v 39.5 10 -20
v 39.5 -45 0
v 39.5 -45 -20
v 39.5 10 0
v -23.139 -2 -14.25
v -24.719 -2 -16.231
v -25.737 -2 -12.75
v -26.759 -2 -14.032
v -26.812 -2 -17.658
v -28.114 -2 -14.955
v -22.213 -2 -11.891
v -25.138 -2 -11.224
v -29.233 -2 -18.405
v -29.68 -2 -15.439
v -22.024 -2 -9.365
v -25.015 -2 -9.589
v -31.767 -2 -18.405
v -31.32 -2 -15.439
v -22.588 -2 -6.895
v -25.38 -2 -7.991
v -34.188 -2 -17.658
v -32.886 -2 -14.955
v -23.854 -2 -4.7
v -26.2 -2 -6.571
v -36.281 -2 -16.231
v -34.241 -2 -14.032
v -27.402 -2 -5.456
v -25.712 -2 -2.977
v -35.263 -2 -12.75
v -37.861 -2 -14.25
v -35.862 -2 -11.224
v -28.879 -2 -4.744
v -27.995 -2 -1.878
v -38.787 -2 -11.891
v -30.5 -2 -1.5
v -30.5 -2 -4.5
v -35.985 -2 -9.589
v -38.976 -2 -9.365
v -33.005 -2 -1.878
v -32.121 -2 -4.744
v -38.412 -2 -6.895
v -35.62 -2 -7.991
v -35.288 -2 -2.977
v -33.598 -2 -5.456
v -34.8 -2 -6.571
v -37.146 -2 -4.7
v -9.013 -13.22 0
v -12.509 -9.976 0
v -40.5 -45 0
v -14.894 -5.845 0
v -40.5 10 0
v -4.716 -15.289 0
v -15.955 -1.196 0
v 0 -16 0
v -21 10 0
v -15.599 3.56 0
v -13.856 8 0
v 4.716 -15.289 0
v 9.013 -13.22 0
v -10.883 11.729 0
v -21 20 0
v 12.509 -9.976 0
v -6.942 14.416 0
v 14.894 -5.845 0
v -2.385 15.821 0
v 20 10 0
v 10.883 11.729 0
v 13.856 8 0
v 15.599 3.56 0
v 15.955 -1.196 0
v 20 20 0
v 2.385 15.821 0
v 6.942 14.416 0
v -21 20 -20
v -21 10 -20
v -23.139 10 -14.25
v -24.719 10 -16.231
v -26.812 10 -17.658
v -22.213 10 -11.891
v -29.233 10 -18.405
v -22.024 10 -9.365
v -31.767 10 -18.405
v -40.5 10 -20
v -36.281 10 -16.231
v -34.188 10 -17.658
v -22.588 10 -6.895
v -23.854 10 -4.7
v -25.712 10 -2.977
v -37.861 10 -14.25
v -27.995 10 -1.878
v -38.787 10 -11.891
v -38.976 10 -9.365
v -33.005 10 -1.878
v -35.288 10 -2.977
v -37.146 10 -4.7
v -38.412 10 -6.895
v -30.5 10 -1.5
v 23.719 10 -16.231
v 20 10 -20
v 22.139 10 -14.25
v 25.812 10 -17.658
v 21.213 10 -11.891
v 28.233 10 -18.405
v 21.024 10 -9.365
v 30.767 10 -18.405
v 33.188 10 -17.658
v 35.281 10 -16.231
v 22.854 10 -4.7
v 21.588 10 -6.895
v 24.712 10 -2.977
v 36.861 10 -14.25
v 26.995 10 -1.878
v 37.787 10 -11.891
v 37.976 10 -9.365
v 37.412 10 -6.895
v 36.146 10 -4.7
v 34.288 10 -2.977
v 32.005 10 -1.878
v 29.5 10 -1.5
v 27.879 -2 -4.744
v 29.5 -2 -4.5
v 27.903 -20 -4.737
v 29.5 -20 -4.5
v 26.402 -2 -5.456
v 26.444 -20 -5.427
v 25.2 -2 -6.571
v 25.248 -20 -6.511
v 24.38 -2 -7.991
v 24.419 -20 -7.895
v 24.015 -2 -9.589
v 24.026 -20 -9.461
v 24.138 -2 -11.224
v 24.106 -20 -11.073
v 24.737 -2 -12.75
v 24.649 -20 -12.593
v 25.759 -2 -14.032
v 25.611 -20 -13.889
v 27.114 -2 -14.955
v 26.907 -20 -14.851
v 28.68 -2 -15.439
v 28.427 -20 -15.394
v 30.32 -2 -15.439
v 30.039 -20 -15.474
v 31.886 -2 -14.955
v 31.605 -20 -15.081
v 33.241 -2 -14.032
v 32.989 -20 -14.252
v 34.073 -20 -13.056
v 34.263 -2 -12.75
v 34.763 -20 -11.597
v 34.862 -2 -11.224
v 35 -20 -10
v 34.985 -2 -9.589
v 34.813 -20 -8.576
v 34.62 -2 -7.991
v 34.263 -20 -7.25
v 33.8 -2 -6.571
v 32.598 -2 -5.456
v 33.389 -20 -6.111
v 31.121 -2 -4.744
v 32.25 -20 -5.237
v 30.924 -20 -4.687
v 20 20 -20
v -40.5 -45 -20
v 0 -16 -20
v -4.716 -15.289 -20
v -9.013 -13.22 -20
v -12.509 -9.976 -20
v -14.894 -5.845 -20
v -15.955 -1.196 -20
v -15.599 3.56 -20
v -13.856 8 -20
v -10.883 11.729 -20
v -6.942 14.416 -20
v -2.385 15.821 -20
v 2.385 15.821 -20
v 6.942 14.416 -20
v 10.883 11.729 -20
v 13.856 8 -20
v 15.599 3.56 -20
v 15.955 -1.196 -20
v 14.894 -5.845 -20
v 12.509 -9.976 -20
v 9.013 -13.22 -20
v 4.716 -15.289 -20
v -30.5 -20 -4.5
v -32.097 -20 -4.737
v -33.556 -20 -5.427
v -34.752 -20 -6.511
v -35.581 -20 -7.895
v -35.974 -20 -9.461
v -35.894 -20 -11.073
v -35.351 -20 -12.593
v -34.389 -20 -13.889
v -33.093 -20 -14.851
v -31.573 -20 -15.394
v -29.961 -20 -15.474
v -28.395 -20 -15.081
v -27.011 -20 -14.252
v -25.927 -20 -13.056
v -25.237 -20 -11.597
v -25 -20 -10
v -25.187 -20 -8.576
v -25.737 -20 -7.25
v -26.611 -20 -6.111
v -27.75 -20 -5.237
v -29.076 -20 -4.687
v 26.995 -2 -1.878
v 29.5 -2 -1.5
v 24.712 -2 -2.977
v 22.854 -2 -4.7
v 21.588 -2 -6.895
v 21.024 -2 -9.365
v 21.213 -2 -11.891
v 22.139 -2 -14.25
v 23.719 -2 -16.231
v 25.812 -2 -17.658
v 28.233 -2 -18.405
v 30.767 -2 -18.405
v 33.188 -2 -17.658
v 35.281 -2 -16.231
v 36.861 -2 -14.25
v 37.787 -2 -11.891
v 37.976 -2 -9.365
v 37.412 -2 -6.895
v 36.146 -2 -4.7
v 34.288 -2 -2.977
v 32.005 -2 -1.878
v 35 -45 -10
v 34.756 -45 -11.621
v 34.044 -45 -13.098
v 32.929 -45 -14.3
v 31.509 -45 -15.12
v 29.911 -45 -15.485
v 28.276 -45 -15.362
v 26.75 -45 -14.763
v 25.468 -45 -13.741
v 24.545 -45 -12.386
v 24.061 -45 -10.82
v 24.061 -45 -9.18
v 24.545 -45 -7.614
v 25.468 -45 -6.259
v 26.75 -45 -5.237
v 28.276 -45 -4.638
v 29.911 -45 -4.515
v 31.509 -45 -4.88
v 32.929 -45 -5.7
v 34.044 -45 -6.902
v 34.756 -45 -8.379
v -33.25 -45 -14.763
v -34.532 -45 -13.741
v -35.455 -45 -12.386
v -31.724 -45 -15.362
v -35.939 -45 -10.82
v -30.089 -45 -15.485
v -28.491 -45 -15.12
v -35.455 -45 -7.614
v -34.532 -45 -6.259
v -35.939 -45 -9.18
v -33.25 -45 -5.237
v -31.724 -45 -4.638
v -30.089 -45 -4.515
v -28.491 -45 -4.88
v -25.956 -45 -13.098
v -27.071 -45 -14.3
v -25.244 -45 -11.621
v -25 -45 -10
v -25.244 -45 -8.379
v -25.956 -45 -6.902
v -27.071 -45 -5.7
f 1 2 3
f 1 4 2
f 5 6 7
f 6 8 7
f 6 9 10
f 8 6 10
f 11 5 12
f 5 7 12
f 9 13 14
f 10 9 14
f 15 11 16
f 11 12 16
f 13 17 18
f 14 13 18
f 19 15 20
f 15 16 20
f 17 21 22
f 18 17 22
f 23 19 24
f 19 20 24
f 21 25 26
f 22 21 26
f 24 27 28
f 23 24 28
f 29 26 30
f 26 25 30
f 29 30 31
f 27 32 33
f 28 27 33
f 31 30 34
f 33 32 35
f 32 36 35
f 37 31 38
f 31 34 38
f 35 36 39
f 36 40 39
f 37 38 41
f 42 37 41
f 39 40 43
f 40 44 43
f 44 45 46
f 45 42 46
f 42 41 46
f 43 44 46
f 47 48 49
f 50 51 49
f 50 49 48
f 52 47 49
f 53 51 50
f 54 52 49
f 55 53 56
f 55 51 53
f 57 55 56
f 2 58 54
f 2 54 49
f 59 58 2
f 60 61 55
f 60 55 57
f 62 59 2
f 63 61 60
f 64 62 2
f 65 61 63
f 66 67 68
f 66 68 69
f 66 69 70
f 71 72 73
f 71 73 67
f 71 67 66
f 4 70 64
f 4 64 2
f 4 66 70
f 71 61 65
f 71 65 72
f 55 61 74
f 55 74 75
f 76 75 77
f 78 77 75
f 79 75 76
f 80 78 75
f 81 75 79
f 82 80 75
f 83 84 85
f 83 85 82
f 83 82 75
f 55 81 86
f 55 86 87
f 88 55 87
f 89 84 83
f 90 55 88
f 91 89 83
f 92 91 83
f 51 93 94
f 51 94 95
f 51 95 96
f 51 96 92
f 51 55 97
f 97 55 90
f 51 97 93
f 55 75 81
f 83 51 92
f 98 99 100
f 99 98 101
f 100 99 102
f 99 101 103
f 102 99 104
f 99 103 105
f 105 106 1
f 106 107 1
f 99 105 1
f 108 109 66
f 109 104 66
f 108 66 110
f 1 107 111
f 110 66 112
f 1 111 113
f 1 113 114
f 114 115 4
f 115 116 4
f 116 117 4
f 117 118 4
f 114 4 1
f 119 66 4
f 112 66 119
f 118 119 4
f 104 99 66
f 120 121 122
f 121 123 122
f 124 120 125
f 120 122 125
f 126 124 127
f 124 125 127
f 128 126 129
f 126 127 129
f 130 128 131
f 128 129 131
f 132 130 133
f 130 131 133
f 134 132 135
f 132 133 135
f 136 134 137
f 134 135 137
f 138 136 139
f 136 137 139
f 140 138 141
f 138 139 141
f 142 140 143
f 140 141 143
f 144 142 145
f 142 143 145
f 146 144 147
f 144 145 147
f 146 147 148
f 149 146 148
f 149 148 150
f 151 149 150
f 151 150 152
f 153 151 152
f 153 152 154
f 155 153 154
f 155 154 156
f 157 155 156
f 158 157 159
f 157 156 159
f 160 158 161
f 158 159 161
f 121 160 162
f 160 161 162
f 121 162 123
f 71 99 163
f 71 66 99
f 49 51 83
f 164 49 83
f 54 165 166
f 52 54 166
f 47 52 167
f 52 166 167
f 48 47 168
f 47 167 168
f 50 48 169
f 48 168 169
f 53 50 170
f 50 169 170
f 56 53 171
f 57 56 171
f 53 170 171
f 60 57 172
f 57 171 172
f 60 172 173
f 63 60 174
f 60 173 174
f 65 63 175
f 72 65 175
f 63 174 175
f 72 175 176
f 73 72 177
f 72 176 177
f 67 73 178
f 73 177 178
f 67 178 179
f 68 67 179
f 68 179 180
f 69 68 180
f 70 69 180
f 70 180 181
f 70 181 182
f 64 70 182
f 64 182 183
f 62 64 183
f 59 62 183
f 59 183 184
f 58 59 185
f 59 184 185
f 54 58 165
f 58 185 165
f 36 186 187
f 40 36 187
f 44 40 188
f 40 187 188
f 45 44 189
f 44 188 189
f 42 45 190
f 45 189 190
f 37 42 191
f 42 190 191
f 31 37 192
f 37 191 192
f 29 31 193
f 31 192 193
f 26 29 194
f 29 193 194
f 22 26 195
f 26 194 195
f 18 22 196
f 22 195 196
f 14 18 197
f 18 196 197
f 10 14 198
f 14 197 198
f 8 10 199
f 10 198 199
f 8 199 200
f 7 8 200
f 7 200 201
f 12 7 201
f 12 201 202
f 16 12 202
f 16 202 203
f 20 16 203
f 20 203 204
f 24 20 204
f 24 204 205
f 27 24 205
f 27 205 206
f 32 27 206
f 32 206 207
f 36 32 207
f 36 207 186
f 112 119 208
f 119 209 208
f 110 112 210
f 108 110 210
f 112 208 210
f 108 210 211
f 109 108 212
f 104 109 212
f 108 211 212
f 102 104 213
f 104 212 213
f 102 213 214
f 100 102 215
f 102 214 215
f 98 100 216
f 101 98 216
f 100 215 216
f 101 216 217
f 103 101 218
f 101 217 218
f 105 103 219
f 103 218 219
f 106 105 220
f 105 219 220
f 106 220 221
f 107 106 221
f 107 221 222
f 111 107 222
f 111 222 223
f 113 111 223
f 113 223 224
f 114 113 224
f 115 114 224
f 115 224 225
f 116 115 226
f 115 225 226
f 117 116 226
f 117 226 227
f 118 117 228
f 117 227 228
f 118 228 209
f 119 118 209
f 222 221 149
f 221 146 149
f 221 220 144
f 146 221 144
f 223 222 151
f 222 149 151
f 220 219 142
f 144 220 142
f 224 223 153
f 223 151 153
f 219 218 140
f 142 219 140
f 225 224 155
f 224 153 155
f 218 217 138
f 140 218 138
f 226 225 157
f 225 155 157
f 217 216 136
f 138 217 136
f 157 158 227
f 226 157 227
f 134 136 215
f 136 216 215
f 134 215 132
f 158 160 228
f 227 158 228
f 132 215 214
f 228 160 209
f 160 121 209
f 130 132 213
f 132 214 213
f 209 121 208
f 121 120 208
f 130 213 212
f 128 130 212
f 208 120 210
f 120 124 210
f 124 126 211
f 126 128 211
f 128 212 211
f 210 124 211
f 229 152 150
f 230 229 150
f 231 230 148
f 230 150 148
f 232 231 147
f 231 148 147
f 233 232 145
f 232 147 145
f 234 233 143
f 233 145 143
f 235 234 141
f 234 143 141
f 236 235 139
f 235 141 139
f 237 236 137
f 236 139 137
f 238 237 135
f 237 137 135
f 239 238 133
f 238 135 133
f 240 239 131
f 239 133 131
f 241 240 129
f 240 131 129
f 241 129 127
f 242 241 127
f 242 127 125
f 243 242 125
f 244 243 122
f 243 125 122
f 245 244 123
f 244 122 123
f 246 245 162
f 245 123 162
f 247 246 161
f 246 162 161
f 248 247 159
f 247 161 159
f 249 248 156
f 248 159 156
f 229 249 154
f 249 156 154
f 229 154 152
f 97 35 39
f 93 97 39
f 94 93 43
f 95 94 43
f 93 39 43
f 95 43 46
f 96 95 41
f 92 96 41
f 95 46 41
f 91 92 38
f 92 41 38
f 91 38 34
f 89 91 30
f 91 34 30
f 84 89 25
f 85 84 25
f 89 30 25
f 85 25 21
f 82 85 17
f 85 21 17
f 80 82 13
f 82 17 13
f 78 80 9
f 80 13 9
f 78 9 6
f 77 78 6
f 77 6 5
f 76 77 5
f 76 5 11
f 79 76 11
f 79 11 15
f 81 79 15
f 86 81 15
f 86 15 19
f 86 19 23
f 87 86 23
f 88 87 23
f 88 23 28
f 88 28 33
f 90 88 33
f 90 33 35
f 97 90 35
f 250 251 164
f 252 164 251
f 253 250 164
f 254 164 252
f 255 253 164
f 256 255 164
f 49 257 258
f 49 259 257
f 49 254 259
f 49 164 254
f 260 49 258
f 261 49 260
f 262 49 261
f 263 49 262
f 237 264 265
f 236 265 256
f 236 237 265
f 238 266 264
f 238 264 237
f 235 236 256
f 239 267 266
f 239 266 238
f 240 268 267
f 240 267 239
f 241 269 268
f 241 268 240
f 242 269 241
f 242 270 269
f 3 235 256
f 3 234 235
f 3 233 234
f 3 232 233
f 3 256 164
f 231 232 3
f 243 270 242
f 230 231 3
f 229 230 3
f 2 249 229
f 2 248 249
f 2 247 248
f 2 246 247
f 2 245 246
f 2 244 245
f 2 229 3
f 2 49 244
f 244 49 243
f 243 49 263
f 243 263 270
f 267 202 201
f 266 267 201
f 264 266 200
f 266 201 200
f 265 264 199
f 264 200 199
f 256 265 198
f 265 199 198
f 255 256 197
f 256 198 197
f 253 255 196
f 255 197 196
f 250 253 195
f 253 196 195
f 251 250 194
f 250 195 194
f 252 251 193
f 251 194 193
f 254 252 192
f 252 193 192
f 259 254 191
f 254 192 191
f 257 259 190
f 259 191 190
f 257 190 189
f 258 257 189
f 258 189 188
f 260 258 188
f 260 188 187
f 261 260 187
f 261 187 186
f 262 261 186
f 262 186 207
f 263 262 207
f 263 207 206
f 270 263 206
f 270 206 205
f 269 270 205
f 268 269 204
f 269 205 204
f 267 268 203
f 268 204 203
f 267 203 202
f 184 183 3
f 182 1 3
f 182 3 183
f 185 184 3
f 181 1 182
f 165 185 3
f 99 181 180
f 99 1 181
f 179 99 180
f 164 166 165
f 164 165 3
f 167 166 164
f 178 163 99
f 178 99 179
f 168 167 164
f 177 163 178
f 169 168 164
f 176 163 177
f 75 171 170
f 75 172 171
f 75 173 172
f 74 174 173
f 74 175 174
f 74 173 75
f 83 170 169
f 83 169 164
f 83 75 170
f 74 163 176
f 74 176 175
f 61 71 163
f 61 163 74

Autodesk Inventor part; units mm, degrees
sketch "Sketch_1" plane through (0, 0, 0) normal (0, 0, 1) x (1, 0, 0)
  line L0 (20, 10) -> (39.5, 10)
  line L1 (39.5, 10) -> (39.5, -20)
  line L2 (20, 10) -> (20, 20)
  line L3 (20, 20) -> (-21, 20)
  line L4 (-21, 20) -> (-21, 10)
  line L5 (-21, 10) -> (-40.5, 10)
  line L6 (-40.5, 10) -> (-40.5, -20)
  line L7 (-40.5, -20) -> (39.5, -20)
  dimension "d29" = 19.5
  dimension "d42" = 10
  dimension "d43" = 41
  dimension "d44" = 19.5
  dimension "d54" = 30
  dimension "d55" = 0
extrude "Extrusion1" add sketch "Sketch_1" against normal blind 20
sketch "Sketch4" plane through (0, 0, 0) normal (0, 0, 1) x (1, 0, 0)
  point P0 (0, 0)
hole "Hole3" at (0, 0, 0) direction (0, 0, -1) diameter 32 depth 20
ref_plane "bf_1_XY" through (0, 0, 0) normal (0, 0, 1) x (1, 0, 0)
ref_plane "bf_1_YZ" through (0, 0, 0) normal (1, 0, 0) x (0, 1, 0)
ref_plane "bf_1_ZX" through (0, 0, 0) normal (0, 1, 0) x (0, 0, 1)
ref_plane "bf_2x_XY" through (0, 0, -10) normal (0, 0, 1) x (1, 0, 0)
ref_plane "bf_2x_YZ" through (0, 0, -10) normal (1, 0, 0) x (0, 1, 0)
ref_plane "bf_2x_ZX" through (0, 0, -10) normal (0, 1, 0) x (0, 0, 1)
sketch "Sketch6" plane through (20, 10, 0) normal (0, 1, 0) x (1, 0, 0)
  line L0 (0, 0) -> (19.5, 0) projected
  line L1 (19.5, 0) -> (9.5, 0)
  line L2 (9.5, 0) -> (9.5, 10)
  line L3 (-60.5, 0) -> (-41, 0) projected
  line L4 (-60.5, 0) -> (-50.5, 0)
  line L5 (-50.5, 0) -> (-50.5, 10)
  dimension "d45" = 10
  dimension "d46" = 10
  dimension "d47" = 10
hole "Hole4" at (29.5, 10, -10) at (-30.5, 10, -10) direction (0, -1, 0) diameter 11 end through all counterbore diameter 17 counterbore depth 12
sketch "Sketch9" plane through (-40.5, -20, 0) normal (0, -1, 0) x (1, 0, 0)
  line L0 (80, -20) -> (60.5, -20) projected
  line L1 (0, 0) -> (0, -20) projected
  line L2 (80, -20) -> (0, -20)
  line L3 (0, -20) -> (0, 0)
  line L4 (0, 0) -> (80, 0)
  line L5 (80, 0) -> (80, -20)
  circle A0 centre (70, -10) radius 5.5 projected
  circle A1 centre (70, -10) radius 5.5
  circle A2 centre (10, -10) radius 5.5 projected
  circle A3 centre (10, -10) radius 5.5
  point P0 (40.5, 0)
  dimension "d48" = 11
  dimension "d49" = 11
extrude "Extrusion2" add sketch "Sketch9" along normal blind 25
properties part number "BF 15 Part1"
